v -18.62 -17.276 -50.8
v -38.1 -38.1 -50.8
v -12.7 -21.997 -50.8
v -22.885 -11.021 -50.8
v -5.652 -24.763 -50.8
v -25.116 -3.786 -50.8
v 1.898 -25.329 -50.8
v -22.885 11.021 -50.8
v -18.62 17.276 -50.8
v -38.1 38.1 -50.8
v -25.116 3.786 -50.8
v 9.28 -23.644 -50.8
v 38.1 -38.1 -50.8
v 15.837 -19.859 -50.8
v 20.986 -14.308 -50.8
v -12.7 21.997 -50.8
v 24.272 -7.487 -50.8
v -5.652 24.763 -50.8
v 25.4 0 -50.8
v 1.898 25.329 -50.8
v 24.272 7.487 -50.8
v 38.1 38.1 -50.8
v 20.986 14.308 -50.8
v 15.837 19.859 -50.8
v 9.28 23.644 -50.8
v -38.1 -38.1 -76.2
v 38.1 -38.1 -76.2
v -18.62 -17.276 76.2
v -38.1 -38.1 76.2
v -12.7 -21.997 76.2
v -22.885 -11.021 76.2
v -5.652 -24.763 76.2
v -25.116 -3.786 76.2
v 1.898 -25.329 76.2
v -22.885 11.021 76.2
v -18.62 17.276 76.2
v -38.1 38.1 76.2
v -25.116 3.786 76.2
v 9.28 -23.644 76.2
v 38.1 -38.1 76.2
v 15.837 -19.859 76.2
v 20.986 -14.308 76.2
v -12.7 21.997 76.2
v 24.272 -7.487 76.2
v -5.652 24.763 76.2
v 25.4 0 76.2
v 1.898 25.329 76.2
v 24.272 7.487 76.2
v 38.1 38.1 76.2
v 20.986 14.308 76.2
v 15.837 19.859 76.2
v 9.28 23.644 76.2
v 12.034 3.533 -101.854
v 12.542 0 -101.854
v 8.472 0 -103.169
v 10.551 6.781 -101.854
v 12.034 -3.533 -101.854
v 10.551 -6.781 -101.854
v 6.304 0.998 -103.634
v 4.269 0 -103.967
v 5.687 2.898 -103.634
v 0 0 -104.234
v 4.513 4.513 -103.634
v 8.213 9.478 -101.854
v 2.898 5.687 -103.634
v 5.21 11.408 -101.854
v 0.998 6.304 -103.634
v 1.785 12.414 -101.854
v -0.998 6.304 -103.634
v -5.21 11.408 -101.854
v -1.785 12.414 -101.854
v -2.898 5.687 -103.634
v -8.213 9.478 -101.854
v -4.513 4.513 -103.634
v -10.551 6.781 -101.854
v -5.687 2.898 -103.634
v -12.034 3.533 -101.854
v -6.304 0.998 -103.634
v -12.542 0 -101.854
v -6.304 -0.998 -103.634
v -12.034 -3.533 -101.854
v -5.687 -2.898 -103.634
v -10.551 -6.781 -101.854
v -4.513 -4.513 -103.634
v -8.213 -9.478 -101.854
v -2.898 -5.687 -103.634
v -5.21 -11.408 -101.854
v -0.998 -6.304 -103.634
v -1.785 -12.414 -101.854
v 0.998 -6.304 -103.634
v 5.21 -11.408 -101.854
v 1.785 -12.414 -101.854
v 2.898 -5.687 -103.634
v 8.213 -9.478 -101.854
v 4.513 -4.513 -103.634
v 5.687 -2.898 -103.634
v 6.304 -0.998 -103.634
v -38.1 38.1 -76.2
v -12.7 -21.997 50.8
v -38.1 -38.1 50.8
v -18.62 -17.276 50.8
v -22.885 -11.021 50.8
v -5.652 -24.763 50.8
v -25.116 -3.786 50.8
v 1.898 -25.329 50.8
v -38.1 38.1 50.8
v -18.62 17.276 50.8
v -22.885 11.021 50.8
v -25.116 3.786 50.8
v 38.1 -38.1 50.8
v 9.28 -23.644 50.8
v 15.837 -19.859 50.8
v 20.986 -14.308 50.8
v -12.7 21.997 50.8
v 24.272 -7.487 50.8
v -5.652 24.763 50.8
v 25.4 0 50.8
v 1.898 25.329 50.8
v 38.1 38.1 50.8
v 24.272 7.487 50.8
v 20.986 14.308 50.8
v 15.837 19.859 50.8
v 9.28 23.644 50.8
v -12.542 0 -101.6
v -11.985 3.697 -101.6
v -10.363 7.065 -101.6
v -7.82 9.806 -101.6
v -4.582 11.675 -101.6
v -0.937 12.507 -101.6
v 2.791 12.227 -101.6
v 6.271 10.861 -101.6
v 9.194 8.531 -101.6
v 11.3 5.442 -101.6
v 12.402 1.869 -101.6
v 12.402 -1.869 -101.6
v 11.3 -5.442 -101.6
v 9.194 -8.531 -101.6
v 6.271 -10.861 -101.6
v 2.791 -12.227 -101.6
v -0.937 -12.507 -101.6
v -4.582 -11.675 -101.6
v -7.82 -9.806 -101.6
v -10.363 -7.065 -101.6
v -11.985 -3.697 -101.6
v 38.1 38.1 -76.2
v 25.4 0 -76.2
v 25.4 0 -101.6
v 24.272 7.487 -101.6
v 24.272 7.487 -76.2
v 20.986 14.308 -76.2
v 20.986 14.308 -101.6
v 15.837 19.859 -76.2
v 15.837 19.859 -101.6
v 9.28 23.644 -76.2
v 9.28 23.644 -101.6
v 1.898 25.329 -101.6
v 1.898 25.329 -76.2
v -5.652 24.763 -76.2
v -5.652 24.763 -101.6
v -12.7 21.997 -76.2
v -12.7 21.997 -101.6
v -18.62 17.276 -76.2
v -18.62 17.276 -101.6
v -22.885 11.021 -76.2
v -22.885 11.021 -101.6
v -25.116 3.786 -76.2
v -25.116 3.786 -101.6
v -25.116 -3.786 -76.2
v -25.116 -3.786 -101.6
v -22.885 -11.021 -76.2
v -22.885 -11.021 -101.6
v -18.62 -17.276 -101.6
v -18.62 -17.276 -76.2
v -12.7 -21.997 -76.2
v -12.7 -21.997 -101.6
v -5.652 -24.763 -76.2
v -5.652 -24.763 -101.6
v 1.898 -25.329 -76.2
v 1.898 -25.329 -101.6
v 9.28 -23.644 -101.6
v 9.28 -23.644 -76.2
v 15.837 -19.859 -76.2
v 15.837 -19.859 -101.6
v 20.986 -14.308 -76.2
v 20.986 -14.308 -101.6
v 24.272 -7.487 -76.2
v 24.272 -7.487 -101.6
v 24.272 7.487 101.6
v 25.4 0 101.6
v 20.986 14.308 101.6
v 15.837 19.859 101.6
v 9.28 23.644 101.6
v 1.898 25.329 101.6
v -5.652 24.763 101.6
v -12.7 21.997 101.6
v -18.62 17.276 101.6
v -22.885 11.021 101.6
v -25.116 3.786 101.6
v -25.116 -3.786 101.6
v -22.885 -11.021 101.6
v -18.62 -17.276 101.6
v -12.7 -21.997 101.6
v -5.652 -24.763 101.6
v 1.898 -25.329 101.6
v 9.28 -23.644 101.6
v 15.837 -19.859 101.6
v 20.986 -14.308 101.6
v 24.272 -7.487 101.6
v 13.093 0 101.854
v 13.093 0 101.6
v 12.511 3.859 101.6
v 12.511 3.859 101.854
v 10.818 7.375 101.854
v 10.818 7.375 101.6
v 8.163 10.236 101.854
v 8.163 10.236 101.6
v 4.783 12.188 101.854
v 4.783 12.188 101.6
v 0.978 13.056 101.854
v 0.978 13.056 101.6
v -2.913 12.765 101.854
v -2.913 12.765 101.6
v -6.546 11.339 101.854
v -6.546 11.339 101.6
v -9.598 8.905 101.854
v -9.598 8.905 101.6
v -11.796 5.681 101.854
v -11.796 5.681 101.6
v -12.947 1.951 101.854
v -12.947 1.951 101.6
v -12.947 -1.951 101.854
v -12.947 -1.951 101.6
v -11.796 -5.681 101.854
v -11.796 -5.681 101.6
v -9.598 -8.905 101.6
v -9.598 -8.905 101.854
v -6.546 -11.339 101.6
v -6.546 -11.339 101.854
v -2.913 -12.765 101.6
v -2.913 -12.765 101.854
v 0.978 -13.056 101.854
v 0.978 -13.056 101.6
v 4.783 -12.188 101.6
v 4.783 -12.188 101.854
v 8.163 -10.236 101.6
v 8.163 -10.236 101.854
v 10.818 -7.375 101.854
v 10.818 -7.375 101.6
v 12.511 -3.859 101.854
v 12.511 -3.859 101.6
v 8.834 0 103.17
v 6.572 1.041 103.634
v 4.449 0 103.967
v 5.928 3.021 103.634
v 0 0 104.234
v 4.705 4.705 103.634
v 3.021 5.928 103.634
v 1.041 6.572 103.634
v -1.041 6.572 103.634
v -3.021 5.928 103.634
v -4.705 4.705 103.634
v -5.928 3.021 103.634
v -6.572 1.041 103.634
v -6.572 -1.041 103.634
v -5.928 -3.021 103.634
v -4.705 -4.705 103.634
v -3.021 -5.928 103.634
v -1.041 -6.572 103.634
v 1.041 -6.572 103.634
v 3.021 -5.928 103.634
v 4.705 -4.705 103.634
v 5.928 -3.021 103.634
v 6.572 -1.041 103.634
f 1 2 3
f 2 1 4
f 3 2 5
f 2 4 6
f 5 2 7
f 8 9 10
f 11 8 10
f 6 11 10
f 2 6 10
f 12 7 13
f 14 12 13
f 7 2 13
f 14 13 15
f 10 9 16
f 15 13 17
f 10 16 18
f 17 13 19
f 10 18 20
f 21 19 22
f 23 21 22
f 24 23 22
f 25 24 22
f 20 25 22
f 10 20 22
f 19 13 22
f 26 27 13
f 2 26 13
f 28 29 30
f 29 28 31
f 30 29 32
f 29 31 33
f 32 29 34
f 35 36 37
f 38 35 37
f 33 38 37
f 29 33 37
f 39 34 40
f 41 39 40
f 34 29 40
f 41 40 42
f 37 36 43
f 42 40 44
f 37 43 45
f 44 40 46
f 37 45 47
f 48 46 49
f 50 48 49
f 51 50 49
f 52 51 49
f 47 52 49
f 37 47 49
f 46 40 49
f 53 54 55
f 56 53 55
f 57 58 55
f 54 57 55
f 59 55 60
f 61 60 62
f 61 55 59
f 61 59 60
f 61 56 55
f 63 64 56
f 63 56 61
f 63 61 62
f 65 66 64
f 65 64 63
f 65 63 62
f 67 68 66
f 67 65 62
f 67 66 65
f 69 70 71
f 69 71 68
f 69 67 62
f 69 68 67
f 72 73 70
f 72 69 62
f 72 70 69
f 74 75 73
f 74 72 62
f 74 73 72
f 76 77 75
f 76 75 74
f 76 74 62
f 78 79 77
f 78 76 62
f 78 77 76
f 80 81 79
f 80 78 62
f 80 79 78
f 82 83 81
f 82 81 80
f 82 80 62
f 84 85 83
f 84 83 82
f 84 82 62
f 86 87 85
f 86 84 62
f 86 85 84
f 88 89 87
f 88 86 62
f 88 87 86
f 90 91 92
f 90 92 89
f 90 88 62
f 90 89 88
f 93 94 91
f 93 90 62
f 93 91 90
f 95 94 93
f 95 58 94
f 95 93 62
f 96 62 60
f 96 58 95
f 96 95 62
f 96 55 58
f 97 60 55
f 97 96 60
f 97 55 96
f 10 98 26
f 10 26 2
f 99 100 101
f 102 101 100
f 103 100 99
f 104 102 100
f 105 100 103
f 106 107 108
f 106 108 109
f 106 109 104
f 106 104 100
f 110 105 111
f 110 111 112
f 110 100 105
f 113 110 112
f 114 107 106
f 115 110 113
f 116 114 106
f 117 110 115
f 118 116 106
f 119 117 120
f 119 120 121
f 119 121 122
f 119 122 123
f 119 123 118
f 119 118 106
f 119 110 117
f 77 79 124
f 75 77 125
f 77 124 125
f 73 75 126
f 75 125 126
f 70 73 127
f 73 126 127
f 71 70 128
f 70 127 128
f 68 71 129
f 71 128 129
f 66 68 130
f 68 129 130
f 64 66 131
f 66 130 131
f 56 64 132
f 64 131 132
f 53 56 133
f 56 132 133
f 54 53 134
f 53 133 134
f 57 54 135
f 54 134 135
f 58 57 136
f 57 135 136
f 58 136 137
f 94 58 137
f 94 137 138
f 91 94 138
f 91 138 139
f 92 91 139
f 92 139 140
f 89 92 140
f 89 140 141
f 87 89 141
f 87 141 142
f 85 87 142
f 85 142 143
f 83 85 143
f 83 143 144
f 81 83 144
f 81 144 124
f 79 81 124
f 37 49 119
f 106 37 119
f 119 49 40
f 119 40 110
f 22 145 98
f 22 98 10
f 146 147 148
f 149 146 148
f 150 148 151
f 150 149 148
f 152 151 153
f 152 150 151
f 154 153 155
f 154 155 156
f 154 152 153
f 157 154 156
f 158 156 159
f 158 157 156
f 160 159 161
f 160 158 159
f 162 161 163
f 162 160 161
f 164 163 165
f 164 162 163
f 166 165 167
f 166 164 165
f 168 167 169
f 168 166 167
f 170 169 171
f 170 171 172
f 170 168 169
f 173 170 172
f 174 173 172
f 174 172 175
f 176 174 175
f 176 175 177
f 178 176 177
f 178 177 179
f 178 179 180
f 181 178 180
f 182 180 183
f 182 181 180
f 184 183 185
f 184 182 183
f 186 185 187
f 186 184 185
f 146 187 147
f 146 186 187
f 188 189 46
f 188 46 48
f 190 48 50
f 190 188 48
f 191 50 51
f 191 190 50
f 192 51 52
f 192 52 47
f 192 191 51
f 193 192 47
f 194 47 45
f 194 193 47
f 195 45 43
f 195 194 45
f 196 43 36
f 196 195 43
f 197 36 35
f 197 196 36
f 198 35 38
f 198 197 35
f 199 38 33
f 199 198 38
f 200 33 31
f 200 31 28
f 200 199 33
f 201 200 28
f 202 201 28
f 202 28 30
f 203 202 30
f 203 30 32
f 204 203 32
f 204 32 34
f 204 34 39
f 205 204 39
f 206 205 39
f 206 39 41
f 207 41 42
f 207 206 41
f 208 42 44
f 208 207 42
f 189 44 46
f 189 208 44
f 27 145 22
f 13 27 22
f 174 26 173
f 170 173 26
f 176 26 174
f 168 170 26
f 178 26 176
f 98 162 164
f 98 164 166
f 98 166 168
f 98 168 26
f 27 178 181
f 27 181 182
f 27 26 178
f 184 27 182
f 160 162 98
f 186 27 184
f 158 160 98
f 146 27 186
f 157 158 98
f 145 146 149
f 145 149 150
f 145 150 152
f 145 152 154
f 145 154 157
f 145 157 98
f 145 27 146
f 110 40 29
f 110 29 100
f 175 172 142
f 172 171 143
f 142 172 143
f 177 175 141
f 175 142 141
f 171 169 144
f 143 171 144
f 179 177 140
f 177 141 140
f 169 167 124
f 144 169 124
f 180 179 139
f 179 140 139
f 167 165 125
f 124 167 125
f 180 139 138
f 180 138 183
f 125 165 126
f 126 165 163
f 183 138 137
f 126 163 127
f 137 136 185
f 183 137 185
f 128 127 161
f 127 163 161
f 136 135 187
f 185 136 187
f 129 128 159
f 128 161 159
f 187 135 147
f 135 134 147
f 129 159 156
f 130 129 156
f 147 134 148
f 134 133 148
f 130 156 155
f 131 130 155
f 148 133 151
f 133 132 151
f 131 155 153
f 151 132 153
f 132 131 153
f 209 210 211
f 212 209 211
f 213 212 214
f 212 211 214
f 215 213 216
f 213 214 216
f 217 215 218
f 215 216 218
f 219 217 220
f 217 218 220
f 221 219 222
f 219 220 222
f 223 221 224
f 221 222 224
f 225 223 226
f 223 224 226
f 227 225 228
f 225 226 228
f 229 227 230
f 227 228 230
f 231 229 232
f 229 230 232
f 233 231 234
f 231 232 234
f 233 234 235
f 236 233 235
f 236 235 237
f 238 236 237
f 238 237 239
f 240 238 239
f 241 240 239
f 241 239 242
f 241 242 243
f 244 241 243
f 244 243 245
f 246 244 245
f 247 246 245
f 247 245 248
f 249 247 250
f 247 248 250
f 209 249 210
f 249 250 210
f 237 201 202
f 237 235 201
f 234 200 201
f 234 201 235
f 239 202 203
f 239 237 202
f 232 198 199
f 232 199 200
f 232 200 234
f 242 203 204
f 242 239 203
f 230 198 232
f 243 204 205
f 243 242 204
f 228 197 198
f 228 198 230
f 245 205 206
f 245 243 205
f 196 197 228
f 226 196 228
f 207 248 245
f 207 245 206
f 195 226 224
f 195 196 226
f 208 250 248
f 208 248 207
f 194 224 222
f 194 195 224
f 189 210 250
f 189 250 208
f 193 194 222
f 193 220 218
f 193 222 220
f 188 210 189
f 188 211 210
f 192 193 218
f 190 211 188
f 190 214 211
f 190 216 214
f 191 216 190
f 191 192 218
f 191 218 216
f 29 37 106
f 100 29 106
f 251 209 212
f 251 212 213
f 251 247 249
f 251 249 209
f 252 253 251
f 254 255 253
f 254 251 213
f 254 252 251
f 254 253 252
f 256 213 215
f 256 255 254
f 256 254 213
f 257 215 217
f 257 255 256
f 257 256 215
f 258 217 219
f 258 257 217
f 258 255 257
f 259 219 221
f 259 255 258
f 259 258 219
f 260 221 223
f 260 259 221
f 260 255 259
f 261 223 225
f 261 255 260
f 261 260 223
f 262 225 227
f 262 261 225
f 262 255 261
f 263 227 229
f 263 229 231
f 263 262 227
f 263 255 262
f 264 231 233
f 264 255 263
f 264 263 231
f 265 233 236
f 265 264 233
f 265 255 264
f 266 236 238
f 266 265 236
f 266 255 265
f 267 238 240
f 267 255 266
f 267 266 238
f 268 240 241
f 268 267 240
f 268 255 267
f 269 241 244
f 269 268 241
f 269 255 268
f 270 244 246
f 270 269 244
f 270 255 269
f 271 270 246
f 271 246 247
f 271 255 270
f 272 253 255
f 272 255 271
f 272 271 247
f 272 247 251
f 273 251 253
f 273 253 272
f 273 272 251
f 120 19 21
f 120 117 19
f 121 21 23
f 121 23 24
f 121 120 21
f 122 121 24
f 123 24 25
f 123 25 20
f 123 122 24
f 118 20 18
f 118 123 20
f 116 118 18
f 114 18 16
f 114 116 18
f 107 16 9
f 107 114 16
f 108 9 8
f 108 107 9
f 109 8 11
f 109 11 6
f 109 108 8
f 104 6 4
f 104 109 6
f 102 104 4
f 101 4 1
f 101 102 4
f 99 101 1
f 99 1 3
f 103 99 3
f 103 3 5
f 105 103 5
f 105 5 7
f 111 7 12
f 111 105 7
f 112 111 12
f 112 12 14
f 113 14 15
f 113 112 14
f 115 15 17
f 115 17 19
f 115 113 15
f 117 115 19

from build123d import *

# Parameters (mm, degrees)
SKETCH1_R           = 25.4
BOSS_EXTRUDE1_DEPTH = 101.6
SKETCH8_W           = 25.4
SKETCH8_H           = 76.2
BOSS_EXTRUDE2_DEPTH = 76.2
SKETCH9_R           = 13.092802434
BOSS_EXTRUDE3_DEPTH = 0.254
DOME1_FACE_RADIUS   = 13.092802434
DOME1_HEIGHT        = 2.38
SKETCH10_R          = 12.541774092
BOSS_EXTRUDE4_DEPTH = 0.254


# Read off the part's stored shape, not the designer's step: Dome2
with BuildPart() as part:
    # Sketch1 → Boss-Extrude1 (new, symmetric)
    with BuildSketch(Plane.XY):
        Circle(SKETCH1_R)
    extrude(amount=BOSS_EXTRUDE1_DEPTH, both=True)

    # Sketch8 → Boss-Extrude2 (add)
    with BuildSketch(Plane(origin=(38.1, 0, 0), x_dir=(0, 0, -1), z_dir=(1, 0, 0))):
        with Locations((-63.5, 0)):
            Rectangle(SKETCH8_W, SKETCH8_H)
    extrude(amount=-BOSS_EXTRUDE2_DEPTH)

    # Mirror1: part across plane


with BuildPart() as part_1:
    add(part.part)
    add(part.part.mirror(Plane.XY))

    # Sketch9 → Boss-Extrude3 (add)
    with BuildSketch(Plane.XY.offset(101.6)):
        Circle(SKETCH9_R)
    extrude(amount=BOSS_EXTRUDE3_DEPTH)

    # Dome1: a dome of height H over a round flat face of radius A is a cap of a sphere of radius (A * A + H * H) / (2 * H)
    dome1_r = (DOME1_FACE_RADIUS * DOME1_FACE_RADIUS + DOME1_HEIGHT * DOME1_HEIGHT) / (2 * DOME1_HEIGHT)
    dome1_base = Plane((0, 0, 101.854), z_dir=(0, 0, 1))
    with Locations(dome1_base.offset(DOME1_HEIGHT - dome1_r)):
        dome1_ball = Sphere(dome1_r, mode=Mode.PRIVATE)
    add(split(dome1_ball, bisect_by=dome1_base, keep=Keep.TOP, mode=Mode.PRIVATE))

    # Sketch10 → Boss-Extrude4 (add)
    with BuildSketch(Plane(origin=(0, 0, -101.6), x_dir=(-1, 0, 0), z_dir=(0, 0, -1))):
        Circle(SKETCH10_R)
    extrude(amount=BOSS_EXTRUDE4_DEPTH)

    # Dome2 outline → Dome2 (revolve)
    with BuildSketch(Plane.XZ):
        with BuildLine():
            Line((0, -101.853999987), (0, -104.234))
            ThreePointArc((0, -104.234), (6.382799116, -103.633737683), (12.541774124, -101.853999987))
            Line((12.541774124, -101.853999987), (0, -101.853999987))
        make_face()
    revolve(axis=Axis((0, 0, 0), (0, 0, 1)))


solid = part_1.part
